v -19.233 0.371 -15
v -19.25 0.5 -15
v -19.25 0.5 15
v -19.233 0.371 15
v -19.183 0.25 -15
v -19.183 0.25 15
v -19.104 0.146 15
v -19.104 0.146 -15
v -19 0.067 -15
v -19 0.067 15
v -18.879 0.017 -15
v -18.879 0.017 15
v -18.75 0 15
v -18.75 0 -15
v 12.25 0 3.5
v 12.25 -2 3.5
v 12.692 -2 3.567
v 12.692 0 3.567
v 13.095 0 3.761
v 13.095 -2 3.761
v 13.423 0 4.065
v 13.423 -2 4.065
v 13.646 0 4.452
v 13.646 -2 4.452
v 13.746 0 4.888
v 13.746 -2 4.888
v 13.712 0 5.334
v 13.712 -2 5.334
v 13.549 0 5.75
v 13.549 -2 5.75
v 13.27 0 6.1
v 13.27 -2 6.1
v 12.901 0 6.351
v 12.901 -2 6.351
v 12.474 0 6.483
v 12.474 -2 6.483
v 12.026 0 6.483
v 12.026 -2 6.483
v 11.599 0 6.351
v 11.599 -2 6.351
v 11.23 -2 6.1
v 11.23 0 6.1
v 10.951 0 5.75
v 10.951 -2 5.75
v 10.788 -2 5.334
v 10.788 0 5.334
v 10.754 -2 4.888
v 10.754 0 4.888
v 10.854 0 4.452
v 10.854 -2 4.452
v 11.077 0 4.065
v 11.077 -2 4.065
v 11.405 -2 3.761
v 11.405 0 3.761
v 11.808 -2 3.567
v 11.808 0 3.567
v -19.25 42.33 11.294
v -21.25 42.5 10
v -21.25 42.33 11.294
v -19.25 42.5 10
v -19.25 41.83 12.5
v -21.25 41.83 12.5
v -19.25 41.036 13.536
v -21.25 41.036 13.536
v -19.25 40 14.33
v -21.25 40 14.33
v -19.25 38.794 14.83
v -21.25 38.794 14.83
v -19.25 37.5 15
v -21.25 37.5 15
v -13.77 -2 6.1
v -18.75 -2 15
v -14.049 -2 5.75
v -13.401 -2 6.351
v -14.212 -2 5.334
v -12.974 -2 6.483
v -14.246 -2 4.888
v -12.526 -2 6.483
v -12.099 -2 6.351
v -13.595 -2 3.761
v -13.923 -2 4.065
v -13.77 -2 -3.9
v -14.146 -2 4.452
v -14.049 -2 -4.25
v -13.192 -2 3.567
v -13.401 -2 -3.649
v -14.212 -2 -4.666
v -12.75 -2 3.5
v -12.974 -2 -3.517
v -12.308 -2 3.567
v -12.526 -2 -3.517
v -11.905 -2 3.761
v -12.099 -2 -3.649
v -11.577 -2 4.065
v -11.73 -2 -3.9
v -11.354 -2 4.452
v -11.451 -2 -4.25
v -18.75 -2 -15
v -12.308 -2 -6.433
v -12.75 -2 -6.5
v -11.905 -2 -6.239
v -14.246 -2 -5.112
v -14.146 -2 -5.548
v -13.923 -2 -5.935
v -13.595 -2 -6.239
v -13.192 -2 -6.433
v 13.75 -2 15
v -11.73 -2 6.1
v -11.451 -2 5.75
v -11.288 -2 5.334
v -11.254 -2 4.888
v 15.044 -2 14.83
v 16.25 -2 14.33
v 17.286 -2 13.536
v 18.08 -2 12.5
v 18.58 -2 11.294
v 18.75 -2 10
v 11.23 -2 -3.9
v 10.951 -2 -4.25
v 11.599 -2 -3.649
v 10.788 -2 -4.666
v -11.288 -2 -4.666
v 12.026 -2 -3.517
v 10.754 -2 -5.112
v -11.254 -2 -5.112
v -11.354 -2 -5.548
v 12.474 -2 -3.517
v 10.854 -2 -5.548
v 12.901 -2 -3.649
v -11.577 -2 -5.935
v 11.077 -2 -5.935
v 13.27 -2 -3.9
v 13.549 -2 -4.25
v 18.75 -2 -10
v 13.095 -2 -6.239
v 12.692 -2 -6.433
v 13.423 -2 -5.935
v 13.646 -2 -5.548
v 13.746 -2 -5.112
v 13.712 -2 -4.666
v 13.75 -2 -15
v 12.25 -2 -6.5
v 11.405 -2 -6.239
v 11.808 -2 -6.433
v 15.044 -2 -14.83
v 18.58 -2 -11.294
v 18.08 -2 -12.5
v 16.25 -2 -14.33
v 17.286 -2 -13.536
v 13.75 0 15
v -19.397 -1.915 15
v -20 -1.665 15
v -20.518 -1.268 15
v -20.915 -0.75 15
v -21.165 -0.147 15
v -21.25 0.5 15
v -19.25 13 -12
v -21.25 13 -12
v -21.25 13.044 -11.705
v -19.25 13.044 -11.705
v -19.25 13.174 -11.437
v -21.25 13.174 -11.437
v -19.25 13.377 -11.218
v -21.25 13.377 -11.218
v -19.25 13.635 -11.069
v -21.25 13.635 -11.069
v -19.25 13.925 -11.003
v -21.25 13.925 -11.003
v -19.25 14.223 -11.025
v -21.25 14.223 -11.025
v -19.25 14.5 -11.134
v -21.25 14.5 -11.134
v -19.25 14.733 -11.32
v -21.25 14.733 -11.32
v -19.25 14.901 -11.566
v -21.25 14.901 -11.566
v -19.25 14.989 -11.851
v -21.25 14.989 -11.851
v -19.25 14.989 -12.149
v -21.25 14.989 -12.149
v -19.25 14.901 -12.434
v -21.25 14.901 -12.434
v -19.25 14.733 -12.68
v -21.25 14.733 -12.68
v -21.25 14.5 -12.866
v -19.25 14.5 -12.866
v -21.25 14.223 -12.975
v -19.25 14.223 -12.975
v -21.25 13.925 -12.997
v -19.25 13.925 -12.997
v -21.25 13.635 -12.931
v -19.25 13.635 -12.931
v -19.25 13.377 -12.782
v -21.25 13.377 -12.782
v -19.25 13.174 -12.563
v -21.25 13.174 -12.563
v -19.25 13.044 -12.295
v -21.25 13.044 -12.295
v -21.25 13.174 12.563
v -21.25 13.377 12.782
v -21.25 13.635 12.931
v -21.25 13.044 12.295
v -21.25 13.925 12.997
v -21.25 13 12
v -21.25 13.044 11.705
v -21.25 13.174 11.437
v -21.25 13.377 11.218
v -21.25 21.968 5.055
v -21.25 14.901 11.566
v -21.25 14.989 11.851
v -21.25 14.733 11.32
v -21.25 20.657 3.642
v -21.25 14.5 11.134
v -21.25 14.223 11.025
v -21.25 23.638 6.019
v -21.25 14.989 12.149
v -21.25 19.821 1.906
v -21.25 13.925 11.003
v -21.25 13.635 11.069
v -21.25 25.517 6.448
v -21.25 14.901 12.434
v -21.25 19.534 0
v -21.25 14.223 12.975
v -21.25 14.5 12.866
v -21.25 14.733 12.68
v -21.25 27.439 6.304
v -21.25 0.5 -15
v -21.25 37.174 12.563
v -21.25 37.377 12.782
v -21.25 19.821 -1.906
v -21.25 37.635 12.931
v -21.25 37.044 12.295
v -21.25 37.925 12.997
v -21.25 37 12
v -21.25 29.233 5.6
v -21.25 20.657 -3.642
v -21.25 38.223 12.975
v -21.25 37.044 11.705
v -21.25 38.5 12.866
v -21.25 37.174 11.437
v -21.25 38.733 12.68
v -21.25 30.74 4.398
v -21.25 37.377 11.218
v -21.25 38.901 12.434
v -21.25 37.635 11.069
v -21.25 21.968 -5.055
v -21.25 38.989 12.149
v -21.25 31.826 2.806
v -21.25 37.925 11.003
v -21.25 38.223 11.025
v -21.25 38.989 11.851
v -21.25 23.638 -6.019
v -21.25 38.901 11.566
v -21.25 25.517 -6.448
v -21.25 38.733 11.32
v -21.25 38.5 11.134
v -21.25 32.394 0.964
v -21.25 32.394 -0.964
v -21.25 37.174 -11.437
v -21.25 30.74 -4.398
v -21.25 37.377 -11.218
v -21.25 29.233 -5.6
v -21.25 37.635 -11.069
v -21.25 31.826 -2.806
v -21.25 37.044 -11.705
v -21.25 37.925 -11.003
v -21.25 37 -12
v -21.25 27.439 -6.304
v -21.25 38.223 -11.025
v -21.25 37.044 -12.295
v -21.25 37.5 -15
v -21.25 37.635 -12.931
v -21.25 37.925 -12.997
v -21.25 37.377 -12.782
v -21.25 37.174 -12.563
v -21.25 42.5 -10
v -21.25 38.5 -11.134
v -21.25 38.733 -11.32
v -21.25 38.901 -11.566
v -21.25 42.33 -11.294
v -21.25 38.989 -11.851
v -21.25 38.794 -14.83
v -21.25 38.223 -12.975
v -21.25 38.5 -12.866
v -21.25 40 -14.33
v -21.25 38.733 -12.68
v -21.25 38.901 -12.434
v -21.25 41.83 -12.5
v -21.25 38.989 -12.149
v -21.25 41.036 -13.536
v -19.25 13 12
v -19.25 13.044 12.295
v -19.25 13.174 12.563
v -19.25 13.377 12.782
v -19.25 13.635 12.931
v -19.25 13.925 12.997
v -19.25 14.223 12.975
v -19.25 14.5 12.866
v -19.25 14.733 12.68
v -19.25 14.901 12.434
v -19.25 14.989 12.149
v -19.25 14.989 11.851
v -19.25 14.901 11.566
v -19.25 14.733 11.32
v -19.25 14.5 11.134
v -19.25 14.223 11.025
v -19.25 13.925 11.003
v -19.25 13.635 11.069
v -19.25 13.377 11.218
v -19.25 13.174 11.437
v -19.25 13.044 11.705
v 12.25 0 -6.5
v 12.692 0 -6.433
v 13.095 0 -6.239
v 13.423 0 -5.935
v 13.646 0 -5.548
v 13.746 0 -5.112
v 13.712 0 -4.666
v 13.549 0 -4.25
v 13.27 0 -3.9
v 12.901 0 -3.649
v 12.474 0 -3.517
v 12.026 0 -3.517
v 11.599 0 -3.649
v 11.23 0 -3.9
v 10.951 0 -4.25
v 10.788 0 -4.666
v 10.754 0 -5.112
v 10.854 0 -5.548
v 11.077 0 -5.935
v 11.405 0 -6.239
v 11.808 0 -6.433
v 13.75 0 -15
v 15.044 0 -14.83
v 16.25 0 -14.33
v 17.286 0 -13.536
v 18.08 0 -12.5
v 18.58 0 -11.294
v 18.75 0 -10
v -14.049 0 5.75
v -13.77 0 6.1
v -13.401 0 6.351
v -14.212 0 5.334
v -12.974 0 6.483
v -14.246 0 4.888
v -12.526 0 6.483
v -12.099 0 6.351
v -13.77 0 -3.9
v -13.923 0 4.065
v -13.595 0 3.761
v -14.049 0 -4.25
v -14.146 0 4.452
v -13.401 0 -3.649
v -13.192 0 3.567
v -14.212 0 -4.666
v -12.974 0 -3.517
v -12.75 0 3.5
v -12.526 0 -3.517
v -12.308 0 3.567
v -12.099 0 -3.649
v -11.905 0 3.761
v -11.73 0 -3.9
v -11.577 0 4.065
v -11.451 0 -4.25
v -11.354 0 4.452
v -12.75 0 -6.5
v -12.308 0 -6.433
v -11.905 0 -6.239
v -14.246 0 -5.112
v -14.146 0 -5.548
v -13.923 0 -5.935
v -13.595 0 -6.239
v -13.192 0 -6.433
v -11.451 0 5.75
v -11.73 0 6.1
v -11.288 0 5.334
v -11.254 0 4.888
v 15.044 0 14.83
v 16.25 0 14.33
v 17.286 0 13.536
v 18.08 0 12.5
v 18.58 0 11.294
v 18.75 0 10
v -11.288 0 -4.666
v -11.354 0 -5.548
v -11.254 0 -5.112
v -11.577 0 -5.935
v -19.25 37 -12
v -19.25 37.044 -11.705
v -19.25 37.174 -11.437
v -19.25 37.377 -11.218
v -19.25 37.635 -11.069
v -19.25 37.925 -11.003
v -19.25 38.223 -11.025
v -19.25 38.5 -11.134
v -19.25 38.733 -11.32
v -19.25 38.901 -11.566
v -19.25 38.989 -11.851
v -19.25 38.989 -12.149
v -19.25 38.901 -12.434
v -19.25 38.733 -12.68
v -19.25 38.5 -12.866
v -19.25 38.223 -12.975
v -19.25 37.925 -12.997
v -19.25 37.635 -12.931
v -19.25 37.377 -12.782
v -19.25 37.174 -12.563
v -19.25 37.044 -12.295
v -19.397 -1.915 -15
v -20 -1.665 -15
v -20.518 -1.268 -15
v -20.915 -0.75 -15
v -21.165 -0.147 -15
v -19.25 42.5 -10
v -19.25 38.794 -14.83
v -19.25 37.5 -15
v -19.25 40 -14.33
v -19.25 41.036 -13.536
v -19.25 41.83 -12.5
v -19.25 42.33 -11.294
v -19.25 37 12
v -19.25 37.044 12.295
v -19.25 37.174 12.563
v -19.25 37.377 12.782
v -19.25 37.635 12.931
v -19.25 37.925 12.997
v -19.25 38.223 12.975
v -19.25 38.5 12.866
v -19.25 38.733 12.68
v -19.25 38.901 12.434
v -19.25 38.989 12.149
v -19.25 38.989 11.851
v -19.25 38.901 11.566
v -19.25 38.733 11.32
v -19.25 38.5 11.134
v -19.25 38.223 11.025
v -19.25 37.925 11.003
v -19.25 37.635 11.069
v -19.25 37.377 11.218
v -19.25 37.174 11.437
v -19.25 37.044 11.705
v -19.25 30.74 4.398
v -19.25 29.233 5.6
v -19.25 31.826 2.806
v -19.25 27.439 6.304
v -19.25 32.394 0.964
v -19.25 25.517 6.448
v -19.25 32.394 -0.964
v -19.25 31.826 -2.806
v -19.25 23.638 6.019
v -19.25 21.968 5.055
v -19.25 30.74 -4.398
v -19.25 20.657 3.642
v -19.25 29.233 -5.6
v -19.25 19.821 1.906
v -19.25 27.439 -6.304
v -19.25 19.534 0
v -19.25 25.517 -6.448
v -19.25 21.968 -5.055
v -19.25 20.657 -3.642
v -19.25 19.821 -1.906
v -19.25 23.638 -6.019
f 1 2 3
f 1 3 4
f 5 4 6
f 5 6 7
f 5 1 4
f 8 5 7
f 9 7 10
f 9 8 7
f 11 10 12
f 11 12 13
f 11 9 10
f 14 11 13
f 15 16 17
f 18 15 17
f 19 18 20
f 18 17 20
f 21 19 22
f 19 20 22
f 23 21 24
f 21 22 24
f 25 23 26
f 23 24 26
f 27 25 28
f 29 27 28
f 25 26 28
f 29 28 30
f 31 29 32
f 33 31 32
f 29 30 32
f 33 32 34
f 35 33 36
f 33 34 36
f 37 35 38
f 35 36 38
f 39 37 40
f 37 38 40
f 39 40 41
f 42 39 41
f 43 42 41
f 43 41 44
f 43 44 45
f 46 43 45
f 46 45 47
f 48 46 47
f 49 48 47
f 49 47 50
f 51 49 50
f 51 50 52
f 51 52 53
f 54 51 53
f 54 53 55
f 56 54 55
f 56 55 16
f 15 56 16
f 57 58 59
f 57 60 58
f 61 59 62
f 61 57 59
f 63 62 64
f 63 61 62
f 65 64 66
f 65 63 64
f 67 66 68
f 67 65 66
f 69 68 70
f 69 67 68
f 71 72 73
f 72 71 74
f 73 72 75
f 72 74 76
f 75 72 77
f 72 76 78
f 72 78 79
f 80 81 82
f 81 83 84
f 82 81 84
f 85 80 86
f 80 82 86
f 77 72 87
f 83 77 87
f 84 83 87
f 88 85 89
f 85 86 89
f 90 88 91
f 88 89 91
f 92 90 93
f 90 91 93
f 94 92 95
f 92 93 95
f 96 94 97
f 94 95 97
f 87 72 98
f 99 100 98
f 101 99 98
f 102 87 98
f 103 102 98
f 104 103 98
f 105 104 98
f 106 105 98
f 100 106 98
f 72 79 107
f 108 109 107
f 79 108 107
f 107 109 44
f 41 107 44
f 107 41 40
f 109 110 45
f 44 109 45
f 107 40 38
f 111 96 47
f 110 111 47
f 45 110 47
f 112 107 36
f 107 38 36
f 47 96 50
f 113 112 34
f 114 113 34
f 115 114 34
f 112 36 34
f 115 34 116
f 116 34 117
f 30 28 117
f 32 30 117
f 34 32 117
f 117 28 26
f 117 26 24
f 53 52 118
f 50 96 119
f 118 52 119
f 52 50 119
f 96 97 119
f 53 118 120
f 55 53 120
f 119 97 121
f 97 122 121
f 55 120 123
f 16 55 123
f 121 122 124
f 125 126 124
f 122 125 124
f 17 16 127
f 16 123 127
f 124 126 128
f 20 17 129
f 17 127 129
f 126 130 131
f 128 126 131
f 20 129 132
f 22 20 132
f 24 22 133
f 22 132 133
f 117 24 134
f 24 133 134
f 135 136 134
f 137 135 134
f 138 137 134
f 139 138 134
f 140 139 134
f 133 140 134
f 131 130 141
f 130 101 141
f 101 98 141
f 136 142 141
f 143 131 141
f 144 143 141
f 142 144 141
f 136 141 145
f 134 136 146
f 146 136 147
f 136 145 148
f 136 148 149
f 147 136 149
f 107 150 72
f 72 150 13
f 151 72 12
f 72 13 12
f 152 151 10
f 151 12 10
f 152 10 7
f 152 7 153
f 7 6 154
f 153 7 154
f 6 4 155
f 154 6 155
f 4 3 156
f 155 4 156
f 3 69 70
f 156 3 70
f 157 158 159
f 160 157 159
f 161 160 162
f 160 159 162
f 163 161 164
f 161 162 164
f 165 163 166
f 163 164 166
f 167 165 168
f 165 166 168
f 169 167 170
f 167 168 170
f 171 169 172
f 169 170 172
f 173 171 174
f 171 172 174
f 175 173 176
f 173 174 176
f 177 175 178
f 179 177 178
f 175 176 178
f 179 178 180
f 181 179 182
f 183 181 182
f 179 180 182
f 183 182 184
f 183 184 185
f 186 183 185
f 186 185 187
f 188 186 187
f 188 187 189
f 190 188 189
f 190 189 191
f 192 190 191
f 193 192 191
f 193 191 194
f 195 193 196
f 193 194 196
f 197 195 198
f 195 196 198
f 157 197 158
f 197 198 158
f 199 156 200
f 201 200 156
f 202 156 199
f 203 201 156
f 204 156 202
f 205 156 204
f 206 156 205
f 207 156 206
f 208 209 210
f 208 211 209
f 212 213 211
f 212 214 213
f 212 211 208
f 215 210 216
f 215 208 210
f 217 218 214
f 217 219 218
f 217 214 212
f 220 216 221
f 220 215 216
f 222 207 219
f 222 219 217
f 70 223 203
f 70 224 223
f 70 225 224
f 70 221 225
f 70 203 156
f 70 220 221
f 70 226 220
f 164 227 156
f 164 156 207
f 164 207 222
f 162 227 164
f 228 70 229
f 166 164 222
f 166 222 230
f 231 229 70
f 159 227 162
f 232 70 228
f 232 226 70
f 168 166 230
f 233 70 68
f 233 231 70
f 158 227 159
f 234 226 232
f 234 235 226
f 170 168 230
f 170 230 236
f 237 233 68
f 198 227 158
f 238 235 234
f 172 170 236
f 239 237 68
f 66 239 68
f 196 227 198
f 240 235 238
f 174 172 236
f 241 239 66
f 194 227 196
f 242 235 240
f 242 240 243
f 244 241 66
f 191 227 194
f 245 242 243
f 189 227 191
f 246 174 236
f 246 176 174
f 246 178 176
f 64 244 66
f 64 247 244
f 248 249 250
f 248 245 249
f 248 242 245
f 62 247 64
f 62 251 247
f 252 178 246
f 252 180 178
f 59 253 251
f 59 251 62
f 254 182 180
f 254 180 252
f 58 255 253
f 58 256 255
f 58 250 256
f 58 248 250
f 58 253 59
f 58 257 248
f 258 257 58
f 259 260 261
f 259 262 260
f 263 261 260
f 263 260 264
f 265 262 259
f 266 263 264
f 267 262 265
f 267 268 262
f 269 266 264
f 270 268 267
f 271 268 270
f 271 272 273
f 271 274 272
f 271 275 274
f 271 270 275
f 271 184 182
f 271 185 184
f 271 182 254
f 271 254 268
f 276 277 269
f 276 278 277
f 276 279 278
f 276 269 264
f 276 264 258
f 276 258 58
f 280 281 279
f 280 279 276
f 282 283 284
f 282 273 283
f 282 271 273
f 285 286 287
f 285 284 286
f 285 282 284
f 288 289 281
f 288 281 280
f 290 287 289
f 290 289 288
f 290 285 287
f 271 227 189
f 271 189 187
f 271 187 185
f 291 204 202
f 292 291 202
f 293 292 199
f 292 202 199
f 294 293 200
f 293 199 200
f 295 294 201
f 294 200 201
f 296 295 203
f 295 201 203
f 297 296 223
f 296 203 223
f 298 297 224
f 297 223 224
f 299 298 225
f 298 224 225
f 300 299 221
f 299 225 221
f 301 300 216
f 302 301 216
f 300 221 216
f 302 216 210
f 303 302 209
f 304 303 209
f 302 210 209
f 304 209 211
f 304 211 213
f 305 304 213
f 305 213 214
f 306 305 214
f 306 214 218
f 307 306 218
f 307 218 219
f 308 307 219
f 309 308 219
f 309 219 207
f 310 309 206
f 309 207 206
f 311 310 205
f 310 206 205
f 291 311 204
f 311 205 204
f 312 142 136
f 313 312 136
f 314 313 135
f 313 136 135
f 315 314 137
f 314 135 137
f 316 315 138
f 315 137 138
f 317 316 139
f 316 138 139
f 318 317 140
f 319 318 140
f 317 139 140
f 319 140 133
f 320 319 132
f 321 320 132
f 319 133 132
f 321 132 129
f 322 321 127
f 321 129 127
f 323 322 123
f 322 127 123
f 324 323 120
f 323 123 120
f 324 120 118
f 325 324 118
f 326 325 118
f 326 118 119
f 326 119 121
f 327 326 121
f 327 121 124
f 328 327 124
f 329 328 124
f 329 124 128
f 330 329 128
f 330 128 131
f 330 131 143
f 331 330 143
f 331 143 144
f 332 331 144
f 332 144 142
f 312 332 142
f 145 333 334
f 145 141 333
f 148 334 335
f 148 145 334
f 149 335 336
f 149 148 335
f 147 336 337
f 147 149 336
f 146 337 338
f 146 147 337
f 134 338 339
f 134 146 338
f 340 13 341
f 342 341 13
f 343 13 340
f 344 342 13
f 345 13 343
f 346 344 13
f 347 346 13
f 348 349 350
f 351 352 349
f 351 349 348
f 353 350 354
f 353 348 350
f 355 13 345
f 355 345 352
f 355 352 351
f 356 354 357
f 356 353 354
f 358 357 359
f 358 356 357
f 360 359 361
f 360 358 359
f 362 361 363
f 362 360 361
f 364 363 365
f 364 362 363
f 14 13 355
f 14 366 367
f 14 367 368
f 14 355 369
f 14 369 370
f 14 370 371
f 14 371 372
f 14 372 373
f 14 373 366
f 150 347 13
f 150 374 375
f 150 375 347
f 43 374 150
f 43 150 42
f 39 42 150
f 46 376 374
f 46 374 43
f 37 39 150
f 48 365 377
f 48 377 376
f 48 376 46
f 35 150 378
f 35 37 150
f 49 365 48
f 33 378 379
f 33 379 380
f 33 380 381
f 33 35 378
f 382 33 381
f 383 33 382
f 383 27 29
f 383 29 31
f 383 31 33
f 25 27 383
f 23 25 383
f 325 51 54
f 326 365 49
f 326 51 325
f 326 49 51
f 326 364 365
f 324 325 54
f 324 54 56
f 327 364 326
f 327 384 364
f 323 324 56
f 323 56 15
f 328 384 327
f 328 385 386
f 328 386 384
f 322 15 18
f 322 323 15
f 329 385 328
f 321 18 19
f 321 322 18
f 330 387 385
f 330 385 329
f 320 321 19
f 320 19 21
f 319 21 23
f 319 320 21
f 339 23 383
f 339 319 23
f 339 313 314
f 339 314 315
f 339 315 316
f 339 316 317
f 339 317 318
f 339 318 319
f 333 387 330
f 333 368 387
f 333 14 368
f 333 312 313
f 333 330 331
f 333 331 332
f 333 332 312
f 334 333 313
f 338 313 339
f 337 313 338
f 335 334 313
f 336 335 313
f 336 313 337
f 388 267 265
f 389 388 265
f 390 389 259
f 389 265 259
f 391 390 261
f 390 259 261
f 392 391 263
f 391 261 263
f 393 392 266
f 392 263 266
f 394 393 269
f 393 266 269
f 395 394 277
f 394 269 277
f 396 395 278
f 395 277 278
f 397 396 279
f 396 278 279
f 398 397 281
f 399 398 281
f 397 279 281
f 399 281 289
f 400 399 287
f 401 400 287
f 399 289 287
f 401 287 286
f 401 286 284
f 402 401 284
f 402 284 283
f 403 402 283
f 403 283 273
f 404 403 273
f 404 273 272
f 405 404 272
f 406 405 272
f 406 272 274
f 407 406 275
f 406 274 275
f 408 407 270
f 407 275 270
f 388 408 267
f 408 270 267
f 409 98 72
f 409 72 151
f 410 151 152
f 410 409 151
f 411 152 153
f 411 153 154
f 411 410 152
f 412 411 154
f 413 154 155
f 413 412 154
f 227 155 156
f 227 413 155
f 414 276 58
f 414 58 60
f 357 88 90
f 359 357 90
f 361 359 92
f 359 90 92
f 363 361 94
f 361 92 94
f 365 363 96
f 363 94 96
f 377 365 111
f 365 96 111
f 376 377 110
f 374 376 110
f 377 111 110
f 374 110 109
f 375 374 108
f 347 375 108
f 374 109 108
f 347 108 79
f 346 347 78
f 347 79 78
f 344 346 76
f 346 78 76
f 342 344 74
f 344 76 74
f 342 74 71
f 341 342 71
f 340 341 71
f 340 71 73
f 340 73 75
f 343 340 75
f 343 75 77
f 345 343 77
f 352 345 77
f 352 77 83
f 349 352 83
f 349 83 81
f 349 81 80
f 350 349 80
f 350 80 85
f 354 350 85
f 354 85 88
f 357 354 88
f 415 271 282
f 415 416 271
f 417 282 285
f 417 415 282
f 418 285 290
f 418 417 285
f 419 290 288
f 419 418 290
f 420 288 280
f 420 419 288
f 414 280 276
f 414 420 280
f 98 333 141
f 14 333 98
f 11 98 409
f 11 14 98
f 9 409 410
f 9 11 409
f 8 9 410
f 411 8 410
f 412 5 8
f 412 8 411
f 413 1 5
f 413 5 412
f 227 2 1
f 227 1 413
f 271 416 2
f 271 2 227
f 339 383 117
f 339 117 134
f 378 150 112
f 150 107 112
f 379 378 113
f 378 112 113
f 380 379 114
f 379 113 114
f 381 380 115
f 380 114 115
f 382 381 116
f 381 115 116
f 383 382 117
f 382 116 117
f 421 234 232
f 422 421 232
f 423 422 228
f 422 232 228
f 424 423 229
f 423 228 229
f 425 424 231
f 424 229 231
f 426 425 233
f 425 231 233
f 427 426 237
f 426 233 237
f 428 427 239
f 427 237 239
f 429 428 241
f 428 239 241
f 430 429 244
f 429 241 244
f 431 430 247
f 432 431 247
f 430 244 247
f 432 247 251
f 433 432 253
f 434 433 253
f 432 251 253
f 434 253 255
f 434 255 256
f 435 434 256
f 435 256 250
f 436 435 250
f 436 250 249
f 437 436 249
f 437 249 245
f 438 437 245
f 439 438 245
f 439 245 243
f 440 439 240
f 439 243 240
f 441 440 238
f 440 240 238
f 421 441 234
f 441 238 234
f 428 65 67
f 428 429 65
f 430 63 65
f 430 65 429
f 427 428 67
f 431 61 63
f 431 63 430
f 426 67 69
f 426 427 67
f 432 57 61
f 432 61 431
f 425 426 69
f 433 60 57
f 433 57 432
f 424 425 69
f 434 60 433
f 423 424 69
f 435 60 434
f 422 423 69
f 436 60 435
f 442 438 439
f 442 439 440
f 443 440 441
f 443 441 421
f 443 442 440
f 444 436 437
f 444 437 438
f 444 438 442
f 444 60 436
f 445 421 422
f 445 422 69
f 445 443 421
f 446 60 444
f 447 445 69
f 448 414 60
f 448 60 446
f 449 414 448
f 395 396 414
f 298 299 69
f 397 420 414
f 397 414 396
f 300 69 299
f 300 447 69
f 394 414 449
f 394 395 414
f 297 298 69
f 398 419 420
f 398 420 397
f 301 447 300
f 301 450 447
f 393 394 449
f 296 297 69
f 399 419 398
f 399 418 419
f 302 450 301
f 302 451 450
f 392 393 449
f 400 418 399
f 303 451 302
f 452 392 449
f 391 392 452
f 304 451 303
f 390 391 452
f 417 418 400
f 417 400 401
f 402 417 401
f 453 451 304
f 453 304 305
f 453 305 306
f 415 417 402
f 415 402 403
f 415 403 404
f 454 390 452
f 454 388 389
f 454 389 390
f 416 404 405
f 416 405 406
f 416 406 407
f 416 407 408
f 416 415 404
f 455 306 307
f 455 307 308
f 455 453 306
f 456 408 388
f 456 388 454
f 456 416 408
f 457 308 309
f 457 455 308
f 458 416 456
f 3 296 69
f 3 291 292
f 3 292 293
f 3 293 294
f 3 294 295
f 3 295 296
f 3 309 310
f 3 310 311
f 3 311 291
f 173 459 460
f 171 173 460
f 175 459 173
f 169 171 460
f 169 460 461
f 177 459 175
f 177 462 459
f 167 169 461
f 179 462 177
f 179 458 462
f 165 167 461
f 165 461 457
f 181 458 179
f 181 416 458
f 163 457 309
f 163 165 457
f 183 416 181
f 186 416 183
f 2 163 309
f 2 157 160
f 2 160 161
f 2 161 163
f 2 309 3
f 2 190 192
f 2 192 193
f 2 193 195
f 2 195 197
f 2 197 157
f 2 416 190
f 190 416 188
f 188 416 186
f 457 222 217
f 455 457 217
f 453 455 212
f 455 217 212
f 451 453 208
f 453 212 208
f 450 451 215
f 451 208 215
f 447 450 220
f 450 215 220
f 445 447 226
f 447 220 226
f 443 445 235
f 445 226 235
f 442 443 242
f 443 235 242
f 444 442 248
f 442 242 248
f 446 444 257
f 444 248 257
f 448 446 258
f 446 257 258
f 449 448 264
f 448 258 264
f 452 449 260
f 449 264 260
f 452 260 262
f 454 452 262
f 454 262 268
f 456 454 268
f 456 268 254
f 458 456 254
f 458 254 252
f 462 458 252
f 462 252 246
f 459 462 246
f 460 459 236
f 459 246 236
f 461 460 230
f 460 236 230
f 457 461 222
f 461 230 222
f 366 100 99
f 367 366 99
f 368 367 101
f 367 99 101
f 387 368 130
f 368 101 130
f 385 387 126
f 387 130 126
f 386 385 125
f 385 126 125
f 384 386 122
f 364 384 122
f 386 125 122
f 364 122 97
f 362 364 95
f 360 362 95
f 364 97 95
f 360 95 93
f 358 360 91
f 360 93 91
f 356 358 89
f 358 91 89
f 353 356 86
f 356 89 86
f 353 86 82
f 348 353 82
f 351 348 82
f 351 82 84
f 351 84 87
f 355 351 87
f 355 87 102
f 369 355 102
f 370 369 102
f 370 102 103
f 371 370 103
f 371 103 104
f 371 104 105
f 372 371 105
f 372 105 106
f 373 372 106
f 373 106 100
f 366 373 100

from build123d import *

# Parameters (mm, degrees)
CROQUIS1_W             = 37.5
CROQUIS1_H             = 30
BRIDA_BASE1_DEPTH      = 2
BRIDA_DE_ARISTA1_DEPTH = 30
CROQUIS9_R             = 1.5
CORTAR_EXTRUIR1_DEPTH  = 10
REDONDEO1_R            = 5
CROQUIS10_R            = 6.466120371
CROQUIS10_R_2          = 1
CORTAR_EXTRUIR2_DEPTH  = 2
REDONDEO2_R            = 5


# Sheet-metal steps are written as plain solids
with BuildPart() as part:
    # Croquis1 → Brida base1 (new body)
    with BuildSketch(Plane(origin=(0, 0, 0), x_dir=(1, 0, 0), z_dir=(0, 1, 0))):
        Rectangle(CROQUIS1_W, CROQUIS1_H)
    extrude(amount=-BRIDA_BASE1_DEPTH)

    # Brida de arista1 section (across the edge) → Brida de arista1 (add)
    with BuildSketch(Plane(origin=(-19.25, 0, -15), x_dir=(1, 0, 0), z_dir=(0, 0, 1))):
        with BuildLine():
            Line((-2, 0.5), (-2, 42.5))
            Line((-2, 42.5), (0, 42.5))
            Line((0, 42.5), (0, 0.5))
            ThreePointArc((0, 0.5), (0.146446609, 0.146446609), (0.5, 0))
            Line((0.5, 0), (0.5, -2))
            ThreePointArc((0.5, -2), (-1.267766953, -1.267766953), (-2, 0.5))
        make_face()
    extrude(amount=BRIDA_DE_ARISTA1_DEPTH)

    # Croquis9 → Cortar-Extruir1 (cut)
    with BuildSketch(Plane.XZ.offset(2)):
        with Locations(Location((-12.75, 5, 0), (0, 0, 270))):
            Circle(CROQUIS9_R)
        with Locations(Location((12.25, 5, 0), (0, 0, 270))):
            Circle(CROQUIS9_R)
        with Locations(Location((12.25, -5, 0), (0, 0, 270))):
            Circle(CROQUIS9_R)
        with Locations(Location((-12.75, -5, 0), (0, 0, 270))):
            Circle(CROQUIS9_R)
    extrude(amount=-CORTAR_EXTRUIR1_DEPTH, mode=Mode.SUBTRACT)

    # Redondeo1
    redondeo1_edges = [part.edges().sort_by_distance(p)[0] for p in [
        (18.75, -1, 15),
        (18.75, -1, -15),
    ]]
    fillet(redondeo1_edges, radius=REDONDEO1_R)

    # Croquis10 → Cortar-Extruir2 (cut)
    with BuildSketch(Plane.ZY.offset(21.25)):
        with Locations(Location((0, 26, 0), (0, 0, 270))):
            Circle(CROQUIS10_R)
        with Locations(Location((-12, 38, 0), (0, 0, 270))):
            Circle(CROQUIS10_R_2)
        with Locations(Location((12, 38, 0), (0, 0, 270))):
            Circle(CROQUIS10_R_2)
        with Locations(Location((12, 14, 0), (0, 0, 270))):
            Circle(CROQUIS10_R_2)
        with Locations(Location((-12, 14, 0), (0, 0, 270))):
            Circle(CROQUIS10_R_2)
    extrude(amount=-CORTAR_EXTRUIR2_DEPTH, mode=Mode.SUBTRACT)

    # Redondeo2
    redondeo2_edges = [part.edges().sort_by_distance(p)[0] for p in [
        (-20.25, 42.5, -15),
        (-20.25, 42.5, 15),
    ]]
    fillet(redondeo2_edges, radius=REDONDEO2_R)


solid = part.part
